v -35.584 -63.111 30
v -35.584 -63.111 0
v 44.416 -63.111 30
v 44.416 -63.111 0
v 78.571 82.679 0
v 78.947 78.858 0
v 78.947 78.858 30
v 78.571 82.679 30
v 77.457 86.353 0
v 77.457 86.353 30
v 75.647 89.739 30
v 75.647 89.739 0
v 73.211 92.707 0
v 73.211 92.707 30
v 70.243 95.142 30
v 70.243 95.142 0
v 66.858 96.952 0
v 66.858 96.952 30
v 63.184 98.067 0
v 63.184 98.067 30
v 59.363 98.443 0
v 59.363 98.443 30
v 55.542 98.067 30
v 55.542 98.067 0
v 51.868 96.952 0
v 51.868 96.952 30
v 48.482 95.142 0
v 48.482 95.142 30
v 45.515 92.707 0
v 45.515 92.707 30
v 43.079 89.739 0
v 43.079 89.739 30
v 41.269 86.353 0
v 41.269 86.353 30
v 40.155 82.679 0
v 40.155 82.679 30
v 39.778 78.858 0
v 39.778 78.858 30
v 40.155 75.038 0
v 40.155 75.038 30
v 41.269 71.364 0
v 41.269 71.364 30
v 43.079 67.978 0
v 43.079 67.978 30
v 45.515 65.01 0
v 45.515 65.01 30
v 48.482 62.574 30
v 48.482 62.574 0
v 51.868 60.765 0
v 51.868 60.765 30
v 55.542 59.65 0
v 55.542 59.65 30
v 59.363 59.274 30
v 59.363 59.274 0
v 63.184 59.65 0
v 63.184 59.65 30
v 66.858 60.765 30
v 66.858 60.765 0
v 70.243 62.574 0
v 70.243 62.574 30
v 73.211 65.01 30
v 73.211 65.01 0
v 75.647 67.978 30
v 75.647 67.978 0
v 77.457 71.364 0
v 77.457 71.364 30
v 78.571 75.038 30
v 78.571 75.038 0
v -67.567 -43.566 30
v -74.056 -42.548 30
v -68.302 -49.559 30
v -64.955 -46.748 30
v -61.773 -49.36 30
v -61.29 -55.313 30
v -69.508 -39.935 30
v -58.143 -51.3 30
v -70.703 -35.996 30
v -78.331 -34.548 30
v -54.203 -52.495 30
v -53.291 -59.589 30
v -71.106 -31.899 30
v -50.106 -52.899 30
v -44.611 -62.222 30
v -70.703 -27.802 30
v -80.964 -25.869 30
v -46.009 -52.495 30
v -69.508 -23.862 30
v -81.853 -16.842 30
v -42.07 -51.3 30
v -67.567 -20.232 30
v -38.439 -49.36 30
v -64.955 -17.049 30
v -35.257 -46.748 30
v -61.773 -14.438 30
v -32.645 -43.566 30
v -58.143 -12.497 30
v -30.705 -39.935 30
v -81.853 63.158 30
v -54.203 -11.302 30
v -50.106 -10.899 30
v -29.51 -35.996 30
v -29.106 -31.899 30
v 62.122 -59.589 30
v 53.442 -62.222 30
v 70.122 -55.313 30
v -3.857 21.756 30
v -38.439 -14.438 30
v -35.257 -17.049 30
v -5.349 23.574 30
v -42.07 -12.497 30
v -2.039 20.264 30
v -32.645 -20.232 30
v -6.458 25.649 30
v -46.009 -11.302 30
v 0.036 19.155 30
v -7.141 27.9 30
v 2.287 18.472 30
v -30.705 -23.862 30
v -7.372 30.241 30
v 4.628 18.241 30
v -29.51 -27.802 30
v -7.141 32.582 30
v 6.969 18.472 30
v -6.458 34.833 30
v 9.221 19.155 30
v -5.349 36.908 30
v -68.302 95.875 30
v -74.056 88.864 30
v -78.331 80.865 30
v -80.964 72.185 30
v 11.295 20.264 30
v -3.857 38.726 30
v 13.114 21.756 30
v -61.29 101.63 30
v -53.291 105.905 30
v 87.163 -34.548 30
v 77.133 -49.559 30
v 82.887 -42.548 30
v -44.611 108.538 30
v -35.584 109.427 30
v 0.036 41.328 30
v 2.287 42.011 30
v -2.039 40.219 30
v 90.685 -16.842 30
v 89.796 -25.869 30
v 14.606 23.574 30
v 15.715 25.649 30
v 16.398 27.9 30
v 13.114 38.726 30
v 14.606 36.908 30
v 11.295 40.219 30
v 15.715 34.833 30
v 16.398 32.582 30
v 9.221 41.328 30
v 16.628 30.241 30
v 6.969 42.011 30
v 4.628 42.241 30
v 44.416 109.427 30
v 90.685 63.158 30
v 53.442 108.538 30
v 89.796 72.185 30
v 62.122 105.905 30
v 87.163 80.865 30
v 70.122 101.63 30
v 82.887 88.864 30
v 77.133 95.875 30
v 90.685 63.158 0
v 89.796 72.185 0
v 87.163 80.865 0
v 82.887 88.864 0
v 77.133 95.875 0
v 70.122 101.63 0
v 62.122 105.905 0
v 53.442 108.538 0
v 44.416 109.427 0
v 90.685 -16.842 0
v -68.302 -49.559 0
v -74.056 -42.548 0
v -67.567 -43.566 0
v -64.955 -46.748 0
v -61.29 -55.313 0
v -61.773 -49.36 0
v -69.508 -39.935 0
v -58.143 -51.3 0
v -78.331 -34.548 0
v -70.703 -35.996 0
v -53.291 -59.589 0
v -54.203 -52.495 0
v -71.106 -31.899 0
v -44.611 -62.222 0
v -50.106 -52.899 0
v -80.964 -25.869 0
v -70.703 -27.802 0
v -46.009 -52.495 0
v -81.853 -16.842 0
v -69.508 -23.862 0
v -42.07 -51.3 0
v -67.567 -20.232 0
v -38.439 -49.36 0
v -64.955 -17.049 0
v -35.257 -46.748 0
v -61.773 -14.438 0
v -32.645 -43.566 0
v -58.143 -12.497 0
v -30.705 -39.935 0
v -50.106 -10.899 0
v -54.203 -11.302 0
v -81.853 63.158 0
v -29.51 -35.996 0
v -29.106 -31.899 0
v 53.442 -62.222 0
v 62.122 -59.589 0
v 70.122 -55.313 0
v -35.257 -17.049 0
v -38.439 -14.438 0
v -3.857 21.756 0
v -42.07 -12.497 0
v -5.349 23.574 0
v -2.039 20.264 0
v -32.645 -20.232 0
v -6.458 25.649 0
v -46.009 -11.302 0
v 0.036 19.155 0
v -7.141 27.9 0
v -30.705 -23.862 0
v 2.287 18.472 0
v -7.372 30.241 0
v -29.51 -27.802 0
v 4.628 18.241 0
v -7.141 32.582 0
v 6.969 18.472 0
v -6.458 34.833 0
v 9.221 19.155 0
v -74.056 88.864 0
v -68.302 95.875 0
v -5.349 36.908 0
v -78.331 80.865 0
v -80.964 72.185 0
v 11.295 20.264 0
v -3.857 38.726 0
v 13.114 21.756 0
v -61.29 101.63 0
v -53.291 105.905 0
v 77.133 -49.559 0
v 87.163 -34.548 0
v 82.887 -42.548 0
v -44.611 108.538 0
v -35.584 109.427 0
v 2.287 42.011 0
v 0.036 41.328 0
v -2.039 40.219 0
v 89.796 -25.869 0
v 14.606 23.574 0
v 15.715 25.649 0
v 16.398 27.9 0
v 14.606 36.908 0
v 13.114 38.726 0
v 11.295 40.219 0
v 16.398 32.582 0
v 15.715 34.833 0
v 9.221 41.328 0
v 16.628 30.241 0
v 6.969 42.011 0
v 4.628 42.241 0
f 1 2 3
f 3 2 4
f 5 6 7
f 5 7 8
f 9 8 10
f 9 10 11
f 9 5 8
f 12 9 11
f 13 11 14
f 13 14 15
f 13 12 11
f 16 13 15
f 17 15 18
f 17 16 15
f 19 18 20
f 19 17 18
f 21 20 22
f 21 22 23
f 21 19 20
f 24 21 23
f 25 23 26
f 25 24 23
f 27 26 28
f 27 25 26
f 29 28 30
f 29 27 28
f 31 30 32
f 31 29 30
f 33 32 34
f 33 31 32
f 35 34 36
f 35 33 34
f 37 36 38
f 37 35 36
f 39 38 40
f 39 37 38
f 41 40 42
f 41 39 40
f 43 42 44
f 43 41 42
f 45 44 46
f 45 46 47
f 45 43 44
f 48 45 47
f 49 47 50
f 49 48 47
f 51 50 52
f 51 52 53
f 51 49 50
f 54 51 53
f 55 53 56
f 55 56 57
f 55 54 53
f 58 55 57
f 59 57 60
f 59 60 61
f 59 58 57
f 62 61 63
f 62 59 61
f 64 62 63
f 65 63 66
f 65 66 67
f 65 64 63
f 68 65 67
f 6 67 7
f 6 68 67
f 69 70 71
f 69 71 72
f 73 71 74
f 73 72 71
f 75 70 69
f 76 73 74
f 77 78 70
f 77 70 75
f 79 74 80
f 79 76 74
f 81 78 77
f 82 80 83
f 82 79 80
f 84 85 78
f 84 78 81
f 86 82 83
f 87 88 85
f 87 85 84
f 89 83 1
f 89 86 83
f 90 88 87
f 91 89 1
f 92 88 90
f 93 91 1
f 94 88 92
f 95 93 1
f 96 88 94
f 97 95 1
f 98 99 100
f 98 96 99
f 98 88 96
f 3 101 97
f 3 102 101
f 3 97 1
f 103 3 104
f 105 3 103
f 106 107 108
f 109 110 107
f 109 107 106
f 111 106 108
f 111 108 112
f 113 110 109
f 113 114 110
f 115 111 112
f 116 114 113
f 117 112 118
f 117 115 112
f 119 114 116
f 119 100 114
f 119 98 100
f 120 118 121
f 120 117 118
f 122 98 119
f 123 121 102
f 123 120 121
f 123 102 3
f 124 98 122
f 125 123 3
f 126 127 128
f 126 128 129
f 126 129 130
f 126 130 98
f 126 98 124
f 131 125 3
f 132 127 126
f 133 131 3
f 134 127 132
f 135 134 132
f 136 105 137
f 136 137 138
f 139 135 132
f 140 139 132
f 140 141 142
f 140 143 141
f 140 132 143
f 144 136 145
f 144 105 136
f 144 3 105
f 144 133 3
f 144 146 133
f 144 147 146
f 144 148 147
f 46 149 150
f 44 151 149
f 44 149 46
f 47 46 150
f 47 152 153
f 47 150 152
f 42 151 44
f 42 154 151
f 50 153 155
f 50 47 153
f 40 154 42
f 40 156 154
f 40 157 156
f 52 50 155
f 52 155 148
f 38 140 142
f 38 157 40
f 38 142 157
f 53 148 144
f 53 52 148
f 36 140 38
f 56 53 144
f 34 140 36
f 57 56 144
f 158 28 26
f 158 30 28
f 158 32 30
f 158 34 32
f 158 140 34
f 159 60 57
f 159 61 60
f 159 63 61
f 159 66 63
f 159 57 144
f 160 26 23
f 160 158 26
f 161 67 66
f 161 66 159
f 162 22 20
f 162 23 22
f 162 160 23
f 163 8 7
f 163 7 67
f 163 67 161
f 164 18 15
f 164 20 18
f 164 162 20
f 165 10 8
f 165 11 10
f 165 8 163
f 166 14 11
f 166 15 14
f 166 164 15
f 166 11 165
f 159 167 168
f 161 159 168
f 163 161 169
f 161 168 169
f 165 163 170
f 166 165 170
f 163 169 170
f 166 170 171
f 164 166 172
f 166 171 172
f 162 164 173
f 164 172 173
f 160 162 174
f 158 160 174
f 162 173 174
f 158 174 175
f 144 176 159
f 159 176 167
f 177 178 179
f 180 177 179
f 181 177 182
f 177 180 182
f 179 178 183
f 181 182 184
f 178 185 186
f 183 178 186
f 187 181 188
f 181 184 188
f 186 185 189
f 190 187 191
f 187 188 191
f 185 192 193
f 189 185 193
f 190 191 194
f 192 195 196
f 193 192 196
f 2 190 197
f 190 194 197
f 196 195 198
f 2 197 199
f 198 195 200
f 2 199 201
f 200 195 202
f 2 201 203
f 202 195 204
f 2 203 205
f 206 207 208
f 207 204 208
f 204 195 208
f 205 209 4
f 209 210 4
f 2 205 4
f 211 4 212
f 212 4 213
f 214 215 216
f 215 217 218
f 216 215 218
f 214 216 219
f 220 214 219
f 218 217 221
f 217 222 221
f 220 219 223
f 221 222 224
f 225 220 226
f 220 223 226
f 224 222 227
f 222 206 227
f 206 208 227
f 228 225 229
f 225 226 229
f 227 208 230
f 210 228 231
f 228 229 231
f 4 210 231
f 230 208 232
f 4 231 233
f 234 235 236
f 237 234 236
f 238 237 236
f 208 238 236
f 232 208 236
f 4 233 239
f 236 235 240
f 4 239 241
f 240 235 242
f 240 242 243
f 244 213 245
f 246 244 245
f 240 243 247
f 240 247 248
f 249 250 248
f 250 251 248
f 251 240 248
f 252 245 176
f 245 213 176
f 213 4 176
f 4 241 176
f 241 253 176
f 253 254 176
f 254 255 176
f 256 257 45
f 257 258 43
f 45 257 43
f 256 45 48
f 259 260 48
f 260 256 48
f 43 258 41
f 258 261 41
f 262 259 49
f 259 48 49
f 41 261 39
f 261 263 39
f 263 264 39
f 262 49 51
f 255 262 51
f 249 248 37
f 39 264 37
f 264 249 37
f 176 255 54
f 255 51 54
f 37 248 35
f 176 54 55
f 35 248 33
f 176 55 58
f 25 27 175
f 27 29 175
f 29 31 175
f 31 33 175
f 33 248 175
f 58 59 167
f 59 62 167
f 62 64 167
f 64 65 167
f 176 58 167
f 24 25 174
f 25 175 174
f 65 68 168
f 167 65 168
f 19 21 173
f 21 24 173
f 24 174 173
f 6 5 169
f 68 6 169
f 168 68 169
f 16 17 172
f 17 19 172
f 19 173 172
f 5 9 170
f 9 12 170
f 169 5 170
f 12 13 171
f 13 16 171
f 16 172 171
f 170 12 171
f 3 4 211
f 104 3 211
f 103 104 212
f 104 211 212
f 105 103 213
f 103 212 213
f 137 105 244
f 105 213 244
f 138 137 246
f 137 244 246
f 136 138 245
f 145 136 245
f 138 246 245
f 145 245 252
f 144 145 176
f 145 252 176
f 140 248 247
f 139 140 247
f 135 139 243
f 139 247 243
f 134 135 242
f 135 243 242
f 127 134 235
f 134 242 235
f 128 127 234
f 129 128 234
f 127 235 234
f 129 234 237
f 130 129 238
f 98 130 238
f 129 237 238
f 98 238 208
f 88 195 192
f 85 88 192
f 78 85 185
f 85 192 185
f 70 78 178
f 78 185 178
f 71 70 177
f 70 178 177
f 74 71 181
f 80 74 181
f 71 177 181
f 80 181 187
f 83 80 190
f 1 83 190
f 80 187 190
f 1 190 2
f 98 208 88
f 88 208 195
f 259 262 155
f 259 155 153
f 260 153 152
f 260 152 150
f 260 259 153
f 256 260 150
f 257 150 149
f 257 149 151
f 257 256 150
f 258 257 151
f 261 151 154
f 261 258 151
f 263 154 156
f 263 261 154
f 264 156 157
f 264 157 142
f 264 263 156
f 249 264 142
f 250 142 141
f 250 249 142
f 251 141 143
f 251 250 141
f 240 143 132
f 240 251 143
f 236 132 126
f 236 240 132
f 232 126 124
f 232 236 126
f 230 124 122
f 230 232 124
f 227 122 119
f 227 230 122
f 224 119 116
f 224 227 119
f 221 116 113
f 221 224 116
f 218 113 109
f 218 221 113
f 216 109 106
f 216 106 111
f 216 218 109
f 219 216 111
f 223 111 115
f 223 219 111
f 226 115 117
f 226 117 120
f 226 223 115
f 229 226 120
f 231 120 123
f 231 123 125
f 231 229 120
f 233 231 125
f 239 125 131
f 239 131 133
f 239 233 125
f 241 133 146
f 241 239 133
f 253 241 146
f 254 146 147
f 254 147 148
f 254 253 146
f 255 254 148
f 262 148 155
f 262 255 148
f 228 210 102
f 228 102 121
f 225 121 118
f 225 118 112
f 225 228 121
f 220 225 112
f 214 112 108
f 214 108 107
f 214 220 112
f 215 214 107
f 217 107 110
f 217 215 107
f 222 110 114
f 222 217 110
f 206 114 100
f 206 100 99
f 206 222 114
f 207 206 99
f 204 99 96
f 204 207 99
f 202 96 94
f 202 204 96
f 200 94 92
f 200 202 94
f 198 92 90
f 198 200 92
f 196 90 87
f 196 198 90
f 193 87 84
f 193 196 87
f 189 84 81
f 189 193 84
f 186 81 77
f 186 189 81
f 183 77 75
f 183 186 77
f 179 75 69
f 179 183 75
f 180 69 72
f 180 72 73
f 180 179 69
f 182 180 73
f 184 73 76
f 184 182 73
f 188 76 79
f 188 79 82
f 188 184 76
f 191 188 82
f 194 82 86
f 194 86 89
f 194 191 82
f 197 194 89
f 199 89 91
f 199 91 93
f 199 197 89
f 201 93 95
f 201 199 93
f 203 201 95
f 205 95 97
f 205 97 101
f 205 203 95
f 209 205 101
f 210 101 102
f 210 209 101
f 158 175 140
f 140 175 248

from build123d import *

# Parameters (mm, degrees)
SKETCH_R     = 12
SKETCH_R_2   = 21
SKETCH_R_3   = 19.584537
PAD_DEPTH    = 30
PAD001_DEPTH = 30


with BuildPart() as part:
    # Sketch → Pad (new body)
    with BuildSketch(Plane.XY):
        with BuildLine():
            Line((-35.584206, -63.111127), (44.415794, -63.111127))
            ThreePointArc((44.415794, -63.111127), (77.13309, -49.55918), (90.685038, -16.841884))
            Line((90.685038, -16.841884), (90.685038, 63.158116))
            ThreePointArc((90.685038, 63.158116), (77.13309, 95.875412), (44.415794, 109.427359))
            Line((44.415794, 109.427359), (-35.584206, 109.427359))
            ThreePointArc((-35.584206, 109.427359), (-68.301501, 95.875412), (-81.853449, 63.158116))
            Line((-81.853449, 63.158116), (-81.853449, -16.841884))
            ThreePointArc((-81.853449, -16.841884), (-68.301501, -49.55918), (-35.584206, -63.111127))
        make_face()
        with Locations((4.62833, 30.241158)):
            Circle(SKETCH_R, mode=Mode.SUBTRACT)
        with Locations((-50.106209, -31.898642)):
            Circle(SKETCH_R_2, mode=Mode.SUBTRACT)
        with Locations((59.362869, 78.858307)):
            Circle(SKETCH_R_3, mode=Mode.SUBTRACT)
    extrude(amount=PAD_DEPTH)

    # Sketch → Pad001 (join)
    with BuildSketch(Plane.XY):
        with BuildLine():
            Line((-35.584206, -63.111127), (44.415794, -63.111127))
            ThreePointArc((44.415794, -63.111127), (77.13309, -49.55918), (90.685038, -16.841884))
            Line((90.685038, -16.841884), (90.685038, 63.158116))
            ThreePointArc((90.685038, 63.158116), (77.13309, 95.875412), (44.415794, 109.427359))
            Line((44.415794, 109.427359), (-35.584206, 109.427359))
            ThreePointArc((-35.584206, 109.427359), (-68.301501, 95.875412), (-81.853449, 63.158116))
            Line((-81.853449, 63.158116), (-81.853449, -16.841884))
            ThreePointArc((-81.853449, -16.841884), (-68.301501, -49.55918), (-35.584206, -63.111127))
        make_face()
        with Locations((4.62833, 30.241158)):
            Circle(SKETCH_R, mode=Mode.SUBTRACT)
        with Locations((-50.106209, -31.898642)):
            Circle(SKETCH_R_2, mode=Mode.SUBTRACT)
        with Locations((59.362869, 78.858307)):
            Circle(SKETCH_R_3, mode=Mode.SUBTRACT)
    extrude(amount=PAD001_DEPTH)


solid = part.part
